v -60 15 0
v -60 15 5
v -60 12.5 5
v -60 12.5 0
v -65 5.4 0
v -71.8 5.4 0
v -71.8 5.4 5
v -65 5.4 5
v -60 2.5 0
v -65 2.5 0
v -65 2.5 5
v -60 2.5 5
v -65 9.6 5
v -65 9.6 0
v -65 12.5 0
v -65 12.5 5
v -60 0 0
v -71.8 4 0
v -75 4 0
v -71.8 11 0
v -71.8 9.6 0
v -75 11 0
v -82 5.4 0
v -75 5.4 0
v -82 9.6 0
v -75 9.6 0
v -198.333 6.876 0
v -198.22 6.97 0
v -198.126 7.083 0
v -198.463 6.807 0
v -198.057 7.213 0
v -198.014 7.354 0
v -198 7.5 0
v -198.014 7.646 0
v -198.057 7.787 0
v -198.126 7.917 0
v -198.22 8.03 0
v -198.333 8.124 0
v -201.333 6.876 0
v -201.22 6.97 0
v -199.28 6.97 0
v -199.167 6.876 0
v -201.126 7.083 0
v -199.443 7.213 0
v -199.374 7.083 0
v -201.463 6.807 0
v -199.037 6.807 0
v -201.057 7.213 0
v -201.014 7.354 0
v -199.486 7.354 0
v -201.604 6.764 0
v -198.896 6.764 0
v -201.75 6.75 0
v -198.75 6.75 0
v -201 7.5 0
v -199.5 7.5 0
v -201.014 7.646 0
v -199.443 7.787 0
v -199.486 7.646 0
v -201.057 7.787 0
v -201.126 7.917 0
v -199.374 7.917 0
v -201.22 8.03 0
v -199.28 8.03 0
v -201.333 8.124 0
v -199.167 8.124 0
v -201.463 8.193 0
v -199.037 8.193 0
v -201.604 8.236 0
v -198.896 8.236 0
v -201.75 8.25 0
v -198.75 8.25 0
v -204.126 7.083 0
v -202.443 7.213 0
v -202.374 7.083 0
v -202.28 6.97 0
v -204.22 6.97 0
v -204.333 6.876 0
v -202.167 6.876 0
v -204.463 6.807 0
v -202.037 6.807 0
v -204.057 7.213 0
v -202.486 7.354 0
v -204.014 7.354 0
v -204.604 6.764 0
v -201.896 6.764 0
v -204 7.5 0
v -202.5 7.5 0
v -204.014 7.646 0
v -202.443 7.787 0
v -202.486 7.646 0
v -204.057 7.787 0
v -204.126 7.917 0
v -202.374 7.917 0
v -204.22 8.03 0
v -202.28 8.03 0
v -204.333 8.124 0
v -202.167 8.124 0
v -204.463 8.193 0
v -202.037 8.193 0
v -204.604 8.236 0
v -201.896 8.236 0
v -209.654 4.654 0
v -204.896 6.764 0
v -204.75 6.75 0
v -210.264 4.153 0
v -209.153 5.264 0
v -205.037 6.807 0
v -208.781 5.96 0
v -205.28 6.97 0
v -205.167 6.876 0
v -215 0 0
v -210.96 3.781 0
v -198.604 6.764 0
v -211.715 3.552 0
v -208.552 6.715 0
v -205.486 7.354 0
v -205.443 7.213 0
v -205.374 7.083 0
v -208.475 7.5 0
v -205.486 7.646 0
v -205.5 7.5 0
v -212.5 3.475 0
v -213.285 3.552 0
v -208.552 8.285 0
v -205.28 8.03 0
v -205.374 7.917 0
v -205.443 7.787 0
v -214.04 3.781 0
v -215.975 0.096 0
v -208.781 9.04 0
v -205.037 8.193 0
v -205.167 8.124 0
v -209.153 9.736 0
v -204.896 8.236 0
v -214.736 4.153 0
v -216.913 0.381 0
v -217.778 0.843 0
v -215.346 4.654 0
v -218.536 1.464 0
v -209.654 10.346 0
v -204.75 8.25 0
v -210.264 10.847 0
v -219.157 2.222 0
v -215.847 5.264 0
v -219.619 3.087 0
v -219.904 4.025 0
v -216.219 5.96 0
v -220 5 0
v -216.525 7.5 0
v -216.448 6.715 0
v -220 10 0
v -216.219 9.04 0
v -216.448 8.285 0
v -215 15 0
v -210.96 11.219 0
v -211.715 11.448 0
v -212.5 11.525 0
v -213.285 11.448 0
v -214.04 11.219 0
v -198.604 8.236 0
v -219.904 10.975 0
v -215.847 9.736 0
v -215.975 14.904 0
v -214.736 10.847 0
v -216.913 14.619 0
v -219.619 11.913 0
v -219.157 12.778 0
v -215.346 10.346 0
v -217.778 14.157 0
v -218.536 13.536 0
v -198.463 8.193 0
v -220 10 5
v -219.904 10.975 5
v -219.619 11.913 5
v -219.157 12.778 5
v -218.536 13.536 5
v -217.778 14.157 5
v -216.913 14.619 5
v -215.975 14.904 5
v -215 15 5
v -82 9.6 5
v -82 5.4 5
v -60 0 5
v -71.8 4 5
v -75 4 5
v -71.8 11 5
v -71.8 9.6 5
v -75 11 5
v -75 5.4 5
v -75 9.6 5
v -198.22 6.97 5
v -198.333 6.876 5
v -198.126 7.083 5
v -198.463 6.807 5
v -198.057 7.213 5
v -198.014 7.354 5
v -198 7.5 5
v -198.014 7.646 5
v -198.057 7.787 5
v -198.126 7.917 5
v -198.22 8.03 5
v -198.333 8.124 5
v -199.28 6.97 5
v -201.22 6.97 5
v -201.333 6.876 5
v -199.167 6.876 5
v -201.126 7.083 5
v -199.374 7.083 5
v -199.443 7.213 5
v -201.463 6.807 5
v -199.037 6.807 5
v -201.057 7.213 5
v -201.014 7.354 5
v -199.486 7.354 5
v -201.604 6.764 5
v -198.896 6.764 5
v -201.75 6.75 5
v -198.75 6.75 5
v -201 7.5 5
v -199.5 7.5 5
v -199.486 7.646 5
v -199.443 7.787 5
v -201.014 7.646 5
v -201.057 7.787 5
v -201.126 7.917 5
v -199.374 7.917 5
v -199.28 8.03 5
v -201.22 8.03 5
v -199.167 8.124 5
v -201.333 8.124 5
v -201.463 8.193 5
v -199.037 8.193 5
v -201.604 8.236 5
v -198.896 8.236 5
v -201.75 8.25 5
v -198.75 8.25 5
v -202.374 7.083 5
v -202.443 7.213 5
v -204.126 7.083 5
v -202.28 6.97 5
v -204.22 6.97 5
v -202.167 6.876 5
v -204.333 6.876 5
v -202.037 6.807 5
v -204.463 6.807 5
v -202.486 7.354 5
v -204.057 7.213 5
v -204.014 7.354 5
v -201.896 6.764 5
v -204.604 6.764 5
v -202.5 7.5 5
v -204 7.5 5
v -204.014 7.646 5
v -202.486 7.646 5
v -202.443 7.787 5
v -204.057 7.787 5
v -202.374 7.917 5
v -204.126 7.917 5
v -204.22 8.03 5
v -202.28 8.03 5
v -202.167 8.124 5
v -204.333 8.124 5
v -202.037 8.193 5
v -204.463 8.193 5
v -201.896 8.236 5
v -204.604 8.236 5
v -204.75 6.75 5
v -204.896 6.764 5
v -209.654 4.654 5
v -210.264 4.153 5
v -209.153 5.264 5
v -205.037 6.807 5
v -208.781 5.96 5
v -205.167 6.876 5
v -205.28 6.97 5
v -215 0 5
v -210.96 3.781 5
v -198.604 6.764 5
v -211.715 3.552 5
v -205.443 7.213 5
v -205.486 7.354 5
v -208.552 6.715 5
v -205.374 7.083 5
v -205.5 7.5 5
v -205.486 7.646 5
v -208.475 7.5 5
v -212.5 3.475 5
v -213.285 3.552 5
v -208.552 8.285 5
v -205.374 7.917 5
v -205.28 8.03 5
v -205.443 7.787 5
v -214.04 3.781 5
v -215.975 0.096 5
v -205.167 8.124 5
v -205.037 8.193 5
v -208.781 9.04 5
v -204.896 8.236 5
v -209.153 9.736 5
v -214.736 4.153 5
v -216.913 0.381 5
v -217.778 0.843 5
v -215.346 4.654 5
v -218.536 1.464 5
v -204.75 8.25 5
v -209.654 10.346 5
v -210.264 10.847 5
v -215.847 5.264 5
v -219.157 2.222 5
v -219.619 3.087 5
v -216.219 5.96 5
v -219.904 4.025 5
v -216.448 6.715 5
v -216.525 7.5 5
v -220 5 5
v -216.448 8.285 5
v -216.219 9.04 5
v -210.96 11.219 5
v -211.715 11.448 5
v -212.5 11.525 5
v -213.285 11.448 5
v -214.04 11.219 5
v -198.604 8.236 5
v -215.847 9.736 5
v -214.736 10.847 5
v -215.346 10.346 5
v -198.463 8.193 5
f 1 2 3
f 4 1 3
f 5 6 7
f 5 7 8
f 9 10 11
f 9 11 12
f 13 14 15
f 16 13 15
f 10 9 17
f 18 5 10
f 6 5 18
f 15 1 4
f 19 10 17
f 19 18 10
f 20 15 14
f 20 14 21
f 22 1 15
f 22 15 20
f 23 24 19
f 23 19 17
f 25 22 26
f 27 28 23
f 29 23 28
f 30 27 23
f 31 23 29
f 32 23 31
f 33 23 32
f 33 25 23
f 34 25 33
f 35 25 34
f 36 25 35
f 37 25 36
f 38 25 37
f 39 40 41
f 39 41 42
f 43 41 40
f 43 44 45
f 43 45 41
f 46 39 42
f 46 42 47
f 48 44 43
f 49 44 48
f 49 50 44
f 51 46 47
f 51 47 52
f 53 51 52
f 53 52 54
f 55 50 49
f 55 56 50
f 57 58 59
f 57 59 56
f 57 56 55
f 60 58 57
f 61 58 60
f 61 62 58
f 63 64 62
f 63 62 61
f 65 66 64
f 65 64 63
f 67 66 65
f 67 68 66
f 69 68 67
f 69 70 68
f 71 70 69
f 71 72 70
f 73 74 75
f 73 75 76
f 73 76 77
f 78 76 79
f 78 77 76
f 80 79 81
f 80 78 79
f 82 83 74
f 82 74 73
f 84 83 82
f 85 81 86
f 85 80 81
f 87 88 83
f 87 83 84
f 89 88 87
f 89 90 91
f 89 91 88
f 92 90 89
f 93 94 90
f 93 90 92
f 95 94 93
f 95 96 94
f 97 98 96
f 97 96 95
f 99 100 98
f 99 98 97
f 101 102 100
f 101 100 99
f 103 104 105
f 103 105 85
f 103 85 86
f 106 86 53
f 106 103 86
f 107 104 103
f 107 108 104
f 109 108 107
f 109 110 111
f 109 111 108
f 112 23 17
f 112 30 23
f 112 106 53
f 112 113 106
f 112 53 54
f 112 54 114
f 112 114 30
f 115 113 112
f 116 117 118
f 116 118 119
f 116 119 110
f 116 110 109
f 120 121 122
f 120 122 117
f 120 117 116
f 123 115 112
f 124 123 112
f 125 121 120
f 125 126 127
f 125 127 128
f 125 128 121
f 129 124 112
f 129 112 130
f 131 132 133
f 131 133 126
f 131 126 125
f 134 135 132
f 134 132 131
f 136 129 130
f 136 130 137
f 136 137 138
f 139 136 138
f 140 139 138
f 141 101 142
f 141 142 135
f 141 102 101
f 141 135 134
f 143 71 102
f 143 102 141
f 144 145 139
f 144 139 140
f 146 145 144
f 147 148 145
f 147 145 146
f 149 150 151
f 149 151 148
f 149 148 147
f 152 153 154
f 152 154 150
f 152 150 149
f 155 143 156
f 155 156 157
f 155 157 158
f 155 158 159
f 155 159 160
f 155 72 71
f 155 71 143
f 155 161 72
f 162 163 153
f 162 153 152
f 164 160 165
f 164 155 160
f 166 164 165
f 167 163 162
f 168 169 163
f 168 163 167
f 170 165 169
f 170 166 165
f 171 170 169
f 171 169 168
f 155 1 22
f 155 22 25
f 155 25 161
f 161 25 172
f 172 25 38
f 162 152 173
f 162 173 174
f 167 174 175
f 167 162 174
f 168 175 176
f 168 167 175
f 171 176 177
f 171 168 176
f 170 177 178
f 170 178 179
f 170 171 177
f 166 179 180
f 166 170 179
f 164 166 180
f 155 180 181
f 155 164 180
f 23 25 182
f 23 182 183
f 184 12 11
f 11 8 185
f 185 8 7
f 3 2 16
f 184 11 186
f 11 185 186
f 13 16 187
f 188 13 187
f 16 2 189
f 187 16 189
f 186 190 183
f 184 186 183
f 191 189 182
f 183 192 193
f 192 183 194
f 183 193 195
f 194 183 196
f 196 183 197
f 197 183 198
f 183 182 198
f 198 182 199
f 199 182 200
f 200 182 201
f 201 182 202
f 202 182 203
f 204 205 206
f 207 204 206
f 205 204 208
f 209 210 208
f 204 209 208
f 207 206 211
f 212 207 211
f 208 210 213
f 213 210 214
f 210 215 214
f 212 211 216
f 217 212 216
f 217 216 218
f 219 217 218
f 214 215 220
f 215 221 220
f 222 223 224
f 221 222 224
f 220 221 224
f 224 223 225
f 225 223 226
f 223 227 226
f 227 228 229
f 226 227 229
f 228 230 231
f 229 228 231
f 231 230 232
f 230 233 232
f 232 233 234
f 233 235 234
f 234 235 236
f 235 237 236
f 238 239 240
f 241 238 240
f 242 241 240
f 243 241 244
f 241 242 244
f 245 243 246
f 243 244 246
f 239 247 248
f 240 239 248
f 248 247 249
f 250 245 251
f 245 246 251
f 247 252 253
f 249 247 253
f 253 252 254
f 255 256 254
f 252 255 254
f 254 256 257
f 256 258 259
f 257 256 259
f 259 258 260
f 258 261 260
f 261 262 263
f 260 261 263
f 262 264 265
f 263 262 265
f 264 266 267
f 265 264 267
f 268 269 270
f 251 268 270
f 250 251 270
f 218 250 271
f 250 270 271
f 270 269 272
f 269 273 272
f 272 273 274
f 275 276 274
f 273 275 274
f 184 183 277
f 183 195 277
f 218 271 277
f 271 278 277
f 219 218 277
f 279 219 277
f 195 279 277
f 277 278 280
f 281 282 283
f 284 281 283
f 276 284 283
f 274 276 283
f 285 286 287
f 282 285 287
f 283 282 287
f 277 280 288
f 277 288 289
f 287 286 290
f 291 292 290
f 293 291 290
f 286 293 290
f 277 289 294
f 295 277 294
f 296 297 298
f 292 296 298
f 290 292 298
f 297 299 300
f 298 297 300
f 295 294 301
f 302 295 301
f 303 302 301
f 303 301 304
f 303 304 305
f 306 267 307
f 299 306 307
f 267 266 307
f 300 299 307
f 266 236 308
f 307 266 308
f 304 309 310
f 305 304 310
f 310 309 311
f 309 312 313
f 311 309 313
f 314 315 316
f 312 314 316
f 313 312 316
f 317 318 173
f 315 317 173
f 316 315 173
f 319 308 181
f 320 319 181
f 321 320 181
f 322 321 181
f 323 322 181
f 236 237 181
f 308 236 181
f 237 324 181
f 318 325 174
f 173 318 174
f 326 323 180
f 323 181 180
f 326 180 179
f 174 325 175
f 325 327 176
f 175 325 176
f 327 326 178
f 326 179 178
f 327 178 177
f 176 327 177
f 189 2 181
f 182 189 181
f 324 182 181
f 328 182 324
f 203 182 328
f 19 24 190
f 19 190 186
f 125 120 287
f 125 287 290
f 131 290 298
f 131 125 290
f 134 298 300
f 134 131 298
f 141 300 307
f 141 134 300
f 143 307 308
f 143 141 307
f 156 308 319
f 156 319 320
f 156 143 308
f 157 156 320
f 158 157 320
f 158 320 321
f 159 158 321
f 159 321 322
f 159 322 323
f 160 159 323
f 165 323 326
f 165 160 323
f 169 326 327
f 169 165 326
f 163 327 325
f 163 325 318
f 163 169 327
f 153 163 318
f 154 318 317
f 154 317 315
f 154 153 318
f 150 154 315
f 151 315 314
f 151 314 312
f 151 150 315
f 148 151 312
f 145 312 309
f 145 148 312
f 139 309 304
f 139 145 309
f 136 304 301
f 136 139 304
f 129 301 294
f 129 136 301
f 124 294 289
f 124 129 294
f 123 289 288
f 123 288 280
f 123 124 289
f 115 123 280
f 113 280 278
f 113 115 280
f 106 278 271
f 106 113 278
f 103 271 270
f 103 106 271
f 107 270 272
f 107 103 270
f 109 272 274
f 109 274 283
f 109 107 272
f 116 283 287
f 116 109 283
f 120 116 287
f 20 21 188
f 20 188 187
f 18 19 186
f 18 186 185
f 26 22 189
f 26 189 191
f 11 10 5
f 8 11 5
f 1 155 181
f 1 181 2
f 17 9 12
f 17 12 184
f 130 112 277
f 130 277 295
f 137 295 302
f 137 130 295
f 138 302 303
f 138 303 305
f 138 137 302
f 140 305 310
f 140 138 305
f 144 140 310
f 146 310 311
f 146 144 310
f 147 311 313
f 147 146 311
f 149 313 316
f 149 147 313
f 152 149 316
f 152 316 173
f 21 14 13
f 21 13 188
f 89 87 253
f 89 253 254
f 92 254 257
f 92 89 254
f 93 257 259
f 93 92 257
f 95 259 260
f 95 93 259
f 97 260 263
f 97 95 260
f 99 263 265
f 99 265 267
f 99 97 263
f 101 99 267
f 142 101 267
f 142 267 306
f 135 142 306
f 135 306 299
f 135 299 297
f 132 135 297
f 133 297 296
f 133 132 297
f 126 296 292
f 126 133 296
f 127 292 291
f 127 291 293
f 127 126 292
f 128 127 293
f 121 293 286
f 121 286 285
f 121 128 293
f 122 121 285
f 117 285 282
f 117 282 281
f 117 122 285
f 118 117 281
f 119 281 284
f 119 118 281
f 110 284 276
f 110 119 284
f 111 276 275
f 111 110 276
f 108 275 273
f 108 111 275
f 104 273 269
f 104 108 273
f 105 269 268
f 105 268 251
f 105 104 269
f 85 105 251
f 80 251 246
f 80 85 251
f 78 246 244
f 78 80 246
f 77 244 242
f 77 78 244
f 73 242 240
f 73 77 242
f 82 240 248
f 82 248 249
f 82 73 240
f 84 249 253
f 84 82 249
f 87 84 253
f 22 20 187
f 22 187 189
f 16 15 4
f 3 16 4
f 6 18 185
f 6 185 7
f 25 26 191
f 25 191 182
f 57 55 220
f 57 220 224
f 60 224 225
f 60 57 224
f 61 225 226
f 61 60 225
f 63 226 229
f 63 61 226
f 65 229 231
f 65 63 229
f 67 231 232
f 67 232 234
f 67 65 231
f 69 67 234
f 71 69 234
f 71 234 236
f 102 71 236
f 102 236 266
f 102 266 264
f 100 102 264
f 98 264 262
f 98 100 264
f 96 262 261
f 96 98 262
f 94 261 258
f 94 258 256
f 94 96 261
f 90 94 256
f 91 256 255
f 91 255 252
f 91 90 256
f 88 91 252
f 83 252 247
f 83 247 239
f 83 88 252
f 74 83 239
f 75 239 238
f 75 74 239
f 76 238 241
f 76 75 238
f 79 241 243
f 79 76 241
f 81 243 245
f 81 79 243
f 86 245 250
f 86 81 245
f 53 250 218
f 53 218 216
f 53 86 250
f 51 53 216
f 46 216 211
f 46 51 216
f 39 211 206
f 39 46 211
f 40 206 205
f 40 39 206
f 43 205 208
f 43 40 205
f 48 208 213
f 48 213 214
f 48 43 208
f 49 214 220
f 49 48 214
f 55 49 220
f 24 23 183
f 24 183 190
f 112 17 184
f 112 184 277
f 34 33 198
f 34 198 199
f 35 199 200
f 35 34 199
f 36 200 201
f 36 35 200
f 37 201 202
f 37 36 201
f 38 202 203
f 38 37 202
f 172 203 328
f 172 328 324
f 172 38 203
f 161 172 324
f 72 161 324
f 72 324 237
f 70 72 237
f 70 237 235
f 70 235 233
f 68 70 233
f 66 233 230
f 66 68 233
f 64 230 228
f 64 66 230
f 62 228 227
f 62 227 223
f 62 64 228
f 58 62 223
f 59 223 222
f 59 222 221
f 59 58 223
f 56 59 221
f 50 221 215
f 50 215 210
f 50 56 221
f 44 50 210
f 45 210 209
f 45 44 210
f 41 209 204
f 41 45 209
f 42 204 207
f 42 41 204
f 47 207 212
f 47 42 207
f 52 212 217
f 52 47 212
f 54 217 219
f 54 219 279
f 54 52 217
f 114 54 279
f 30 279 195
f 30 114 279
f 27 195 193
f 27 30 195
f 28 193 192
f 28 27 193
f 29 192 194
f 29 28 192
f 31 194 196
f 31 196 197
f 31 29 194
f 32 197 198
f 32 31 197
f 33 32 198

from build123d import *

# Parameters (mm, degrees)
SKETCH1_R           = 4.025
SKETCH1_R_2         = 0.75
SKETCH1_W           = 5
SKETCH1_H           = 10
BOSS_EXTRUDE1_DEPTH = 5
CUT_EXTRUDE1_DEPTH  = 10
CUT_EXTRUDE2_DEPTH  = 10


with BuildPart() as part:
    # Sketch1 → Boss-Extrude1 (new body)
    with BuildSketch(Plane.XY):
        with BuildLine():
            Line((-215, 15), (-60, 15))
            ThreePointArc((-60, 15), (-56.464466094, 13.535533906), (-55, 10))
            Line((-55, 10), (-55, 5))
            ThreePointArc((-55, 5), (-56.464466094, 1.464466094), (-60, 0))
            Line((-60, 0), (-215, 0))
            ThreePointArc((-215, 0), (-218.535533906, 1.464466094), (-220, 5))
            Line((-220, 5), (-220, 10))
            ThreePointArc((-220, 10), (-218.535533906, 13.535533906), (-215, 15))
        make_face()
        with Locations((-212.5, 7.5)):
            Circle(SKETCH1_R, mode=Mode.SUBTRACT)
        with Locations((-204.75, 7.5)):
            Circle(SKETCH1_R_2, mode=Mode.SUBTRACT)
        with Locations((-201.75, 7.5)):
            Circle(SKETCH1_R_2, mode=Mode.SUBTRACT)
        with Locations((-198.75, 7.5)):
            Circle(SKETCH1_R_2, mode=Mode.SUBTRACT)
        with Locations((-62.5, 7.5)):
            Rectangle(SKETCH1_W, SKETCH1_H, mode=Mode.SUBTRACT)
    extrude(amount=BOSS_EXTRUDE1_DEPTH)

    # Sketch2 → Cut-Extrude1 (cut)
    with BuildSketch(Plane(origin=(0, 0, 0), x_dir=(-1, 0, 0), z_dir=(0, 0, -1))):
        Polygon((65, 9.6), (71.8, 9.6), (71.8, 11), (75, 11), (75, 9.6), (82, 9.6), (82, 5.4), (75, 5.4), (75, 4), (71.8, 4), (71.8, 5.4), (65, 5.4), align=None)
    extrude(amount=-CUT_EXTRUDE1_DEPTH, mode=Mode.SUBTRACT)

    # Sketch3 → Cut-Extrude2 (cut)
    with BuildSketch(Plane(origin=(0, 0, 0), x_dir=(-1, 0, 0), z_dir=(0, 0, -1))):
        with BuildLine():
            Line((60, 15), (60, 0))
            ThreePointArc((60, 0), (56.464466094, 1.464466094), (55, 5))
            Line((55, 5), (55, 10))
            ThreePointArc((55, 10), (56.464466094, 13.535533906), (60, 15))
        make_face()
    extrude(amount=-CUT_EXTRUDE2_DEPTH, mode=Mode.SUBTRACT)


solid = part.part
